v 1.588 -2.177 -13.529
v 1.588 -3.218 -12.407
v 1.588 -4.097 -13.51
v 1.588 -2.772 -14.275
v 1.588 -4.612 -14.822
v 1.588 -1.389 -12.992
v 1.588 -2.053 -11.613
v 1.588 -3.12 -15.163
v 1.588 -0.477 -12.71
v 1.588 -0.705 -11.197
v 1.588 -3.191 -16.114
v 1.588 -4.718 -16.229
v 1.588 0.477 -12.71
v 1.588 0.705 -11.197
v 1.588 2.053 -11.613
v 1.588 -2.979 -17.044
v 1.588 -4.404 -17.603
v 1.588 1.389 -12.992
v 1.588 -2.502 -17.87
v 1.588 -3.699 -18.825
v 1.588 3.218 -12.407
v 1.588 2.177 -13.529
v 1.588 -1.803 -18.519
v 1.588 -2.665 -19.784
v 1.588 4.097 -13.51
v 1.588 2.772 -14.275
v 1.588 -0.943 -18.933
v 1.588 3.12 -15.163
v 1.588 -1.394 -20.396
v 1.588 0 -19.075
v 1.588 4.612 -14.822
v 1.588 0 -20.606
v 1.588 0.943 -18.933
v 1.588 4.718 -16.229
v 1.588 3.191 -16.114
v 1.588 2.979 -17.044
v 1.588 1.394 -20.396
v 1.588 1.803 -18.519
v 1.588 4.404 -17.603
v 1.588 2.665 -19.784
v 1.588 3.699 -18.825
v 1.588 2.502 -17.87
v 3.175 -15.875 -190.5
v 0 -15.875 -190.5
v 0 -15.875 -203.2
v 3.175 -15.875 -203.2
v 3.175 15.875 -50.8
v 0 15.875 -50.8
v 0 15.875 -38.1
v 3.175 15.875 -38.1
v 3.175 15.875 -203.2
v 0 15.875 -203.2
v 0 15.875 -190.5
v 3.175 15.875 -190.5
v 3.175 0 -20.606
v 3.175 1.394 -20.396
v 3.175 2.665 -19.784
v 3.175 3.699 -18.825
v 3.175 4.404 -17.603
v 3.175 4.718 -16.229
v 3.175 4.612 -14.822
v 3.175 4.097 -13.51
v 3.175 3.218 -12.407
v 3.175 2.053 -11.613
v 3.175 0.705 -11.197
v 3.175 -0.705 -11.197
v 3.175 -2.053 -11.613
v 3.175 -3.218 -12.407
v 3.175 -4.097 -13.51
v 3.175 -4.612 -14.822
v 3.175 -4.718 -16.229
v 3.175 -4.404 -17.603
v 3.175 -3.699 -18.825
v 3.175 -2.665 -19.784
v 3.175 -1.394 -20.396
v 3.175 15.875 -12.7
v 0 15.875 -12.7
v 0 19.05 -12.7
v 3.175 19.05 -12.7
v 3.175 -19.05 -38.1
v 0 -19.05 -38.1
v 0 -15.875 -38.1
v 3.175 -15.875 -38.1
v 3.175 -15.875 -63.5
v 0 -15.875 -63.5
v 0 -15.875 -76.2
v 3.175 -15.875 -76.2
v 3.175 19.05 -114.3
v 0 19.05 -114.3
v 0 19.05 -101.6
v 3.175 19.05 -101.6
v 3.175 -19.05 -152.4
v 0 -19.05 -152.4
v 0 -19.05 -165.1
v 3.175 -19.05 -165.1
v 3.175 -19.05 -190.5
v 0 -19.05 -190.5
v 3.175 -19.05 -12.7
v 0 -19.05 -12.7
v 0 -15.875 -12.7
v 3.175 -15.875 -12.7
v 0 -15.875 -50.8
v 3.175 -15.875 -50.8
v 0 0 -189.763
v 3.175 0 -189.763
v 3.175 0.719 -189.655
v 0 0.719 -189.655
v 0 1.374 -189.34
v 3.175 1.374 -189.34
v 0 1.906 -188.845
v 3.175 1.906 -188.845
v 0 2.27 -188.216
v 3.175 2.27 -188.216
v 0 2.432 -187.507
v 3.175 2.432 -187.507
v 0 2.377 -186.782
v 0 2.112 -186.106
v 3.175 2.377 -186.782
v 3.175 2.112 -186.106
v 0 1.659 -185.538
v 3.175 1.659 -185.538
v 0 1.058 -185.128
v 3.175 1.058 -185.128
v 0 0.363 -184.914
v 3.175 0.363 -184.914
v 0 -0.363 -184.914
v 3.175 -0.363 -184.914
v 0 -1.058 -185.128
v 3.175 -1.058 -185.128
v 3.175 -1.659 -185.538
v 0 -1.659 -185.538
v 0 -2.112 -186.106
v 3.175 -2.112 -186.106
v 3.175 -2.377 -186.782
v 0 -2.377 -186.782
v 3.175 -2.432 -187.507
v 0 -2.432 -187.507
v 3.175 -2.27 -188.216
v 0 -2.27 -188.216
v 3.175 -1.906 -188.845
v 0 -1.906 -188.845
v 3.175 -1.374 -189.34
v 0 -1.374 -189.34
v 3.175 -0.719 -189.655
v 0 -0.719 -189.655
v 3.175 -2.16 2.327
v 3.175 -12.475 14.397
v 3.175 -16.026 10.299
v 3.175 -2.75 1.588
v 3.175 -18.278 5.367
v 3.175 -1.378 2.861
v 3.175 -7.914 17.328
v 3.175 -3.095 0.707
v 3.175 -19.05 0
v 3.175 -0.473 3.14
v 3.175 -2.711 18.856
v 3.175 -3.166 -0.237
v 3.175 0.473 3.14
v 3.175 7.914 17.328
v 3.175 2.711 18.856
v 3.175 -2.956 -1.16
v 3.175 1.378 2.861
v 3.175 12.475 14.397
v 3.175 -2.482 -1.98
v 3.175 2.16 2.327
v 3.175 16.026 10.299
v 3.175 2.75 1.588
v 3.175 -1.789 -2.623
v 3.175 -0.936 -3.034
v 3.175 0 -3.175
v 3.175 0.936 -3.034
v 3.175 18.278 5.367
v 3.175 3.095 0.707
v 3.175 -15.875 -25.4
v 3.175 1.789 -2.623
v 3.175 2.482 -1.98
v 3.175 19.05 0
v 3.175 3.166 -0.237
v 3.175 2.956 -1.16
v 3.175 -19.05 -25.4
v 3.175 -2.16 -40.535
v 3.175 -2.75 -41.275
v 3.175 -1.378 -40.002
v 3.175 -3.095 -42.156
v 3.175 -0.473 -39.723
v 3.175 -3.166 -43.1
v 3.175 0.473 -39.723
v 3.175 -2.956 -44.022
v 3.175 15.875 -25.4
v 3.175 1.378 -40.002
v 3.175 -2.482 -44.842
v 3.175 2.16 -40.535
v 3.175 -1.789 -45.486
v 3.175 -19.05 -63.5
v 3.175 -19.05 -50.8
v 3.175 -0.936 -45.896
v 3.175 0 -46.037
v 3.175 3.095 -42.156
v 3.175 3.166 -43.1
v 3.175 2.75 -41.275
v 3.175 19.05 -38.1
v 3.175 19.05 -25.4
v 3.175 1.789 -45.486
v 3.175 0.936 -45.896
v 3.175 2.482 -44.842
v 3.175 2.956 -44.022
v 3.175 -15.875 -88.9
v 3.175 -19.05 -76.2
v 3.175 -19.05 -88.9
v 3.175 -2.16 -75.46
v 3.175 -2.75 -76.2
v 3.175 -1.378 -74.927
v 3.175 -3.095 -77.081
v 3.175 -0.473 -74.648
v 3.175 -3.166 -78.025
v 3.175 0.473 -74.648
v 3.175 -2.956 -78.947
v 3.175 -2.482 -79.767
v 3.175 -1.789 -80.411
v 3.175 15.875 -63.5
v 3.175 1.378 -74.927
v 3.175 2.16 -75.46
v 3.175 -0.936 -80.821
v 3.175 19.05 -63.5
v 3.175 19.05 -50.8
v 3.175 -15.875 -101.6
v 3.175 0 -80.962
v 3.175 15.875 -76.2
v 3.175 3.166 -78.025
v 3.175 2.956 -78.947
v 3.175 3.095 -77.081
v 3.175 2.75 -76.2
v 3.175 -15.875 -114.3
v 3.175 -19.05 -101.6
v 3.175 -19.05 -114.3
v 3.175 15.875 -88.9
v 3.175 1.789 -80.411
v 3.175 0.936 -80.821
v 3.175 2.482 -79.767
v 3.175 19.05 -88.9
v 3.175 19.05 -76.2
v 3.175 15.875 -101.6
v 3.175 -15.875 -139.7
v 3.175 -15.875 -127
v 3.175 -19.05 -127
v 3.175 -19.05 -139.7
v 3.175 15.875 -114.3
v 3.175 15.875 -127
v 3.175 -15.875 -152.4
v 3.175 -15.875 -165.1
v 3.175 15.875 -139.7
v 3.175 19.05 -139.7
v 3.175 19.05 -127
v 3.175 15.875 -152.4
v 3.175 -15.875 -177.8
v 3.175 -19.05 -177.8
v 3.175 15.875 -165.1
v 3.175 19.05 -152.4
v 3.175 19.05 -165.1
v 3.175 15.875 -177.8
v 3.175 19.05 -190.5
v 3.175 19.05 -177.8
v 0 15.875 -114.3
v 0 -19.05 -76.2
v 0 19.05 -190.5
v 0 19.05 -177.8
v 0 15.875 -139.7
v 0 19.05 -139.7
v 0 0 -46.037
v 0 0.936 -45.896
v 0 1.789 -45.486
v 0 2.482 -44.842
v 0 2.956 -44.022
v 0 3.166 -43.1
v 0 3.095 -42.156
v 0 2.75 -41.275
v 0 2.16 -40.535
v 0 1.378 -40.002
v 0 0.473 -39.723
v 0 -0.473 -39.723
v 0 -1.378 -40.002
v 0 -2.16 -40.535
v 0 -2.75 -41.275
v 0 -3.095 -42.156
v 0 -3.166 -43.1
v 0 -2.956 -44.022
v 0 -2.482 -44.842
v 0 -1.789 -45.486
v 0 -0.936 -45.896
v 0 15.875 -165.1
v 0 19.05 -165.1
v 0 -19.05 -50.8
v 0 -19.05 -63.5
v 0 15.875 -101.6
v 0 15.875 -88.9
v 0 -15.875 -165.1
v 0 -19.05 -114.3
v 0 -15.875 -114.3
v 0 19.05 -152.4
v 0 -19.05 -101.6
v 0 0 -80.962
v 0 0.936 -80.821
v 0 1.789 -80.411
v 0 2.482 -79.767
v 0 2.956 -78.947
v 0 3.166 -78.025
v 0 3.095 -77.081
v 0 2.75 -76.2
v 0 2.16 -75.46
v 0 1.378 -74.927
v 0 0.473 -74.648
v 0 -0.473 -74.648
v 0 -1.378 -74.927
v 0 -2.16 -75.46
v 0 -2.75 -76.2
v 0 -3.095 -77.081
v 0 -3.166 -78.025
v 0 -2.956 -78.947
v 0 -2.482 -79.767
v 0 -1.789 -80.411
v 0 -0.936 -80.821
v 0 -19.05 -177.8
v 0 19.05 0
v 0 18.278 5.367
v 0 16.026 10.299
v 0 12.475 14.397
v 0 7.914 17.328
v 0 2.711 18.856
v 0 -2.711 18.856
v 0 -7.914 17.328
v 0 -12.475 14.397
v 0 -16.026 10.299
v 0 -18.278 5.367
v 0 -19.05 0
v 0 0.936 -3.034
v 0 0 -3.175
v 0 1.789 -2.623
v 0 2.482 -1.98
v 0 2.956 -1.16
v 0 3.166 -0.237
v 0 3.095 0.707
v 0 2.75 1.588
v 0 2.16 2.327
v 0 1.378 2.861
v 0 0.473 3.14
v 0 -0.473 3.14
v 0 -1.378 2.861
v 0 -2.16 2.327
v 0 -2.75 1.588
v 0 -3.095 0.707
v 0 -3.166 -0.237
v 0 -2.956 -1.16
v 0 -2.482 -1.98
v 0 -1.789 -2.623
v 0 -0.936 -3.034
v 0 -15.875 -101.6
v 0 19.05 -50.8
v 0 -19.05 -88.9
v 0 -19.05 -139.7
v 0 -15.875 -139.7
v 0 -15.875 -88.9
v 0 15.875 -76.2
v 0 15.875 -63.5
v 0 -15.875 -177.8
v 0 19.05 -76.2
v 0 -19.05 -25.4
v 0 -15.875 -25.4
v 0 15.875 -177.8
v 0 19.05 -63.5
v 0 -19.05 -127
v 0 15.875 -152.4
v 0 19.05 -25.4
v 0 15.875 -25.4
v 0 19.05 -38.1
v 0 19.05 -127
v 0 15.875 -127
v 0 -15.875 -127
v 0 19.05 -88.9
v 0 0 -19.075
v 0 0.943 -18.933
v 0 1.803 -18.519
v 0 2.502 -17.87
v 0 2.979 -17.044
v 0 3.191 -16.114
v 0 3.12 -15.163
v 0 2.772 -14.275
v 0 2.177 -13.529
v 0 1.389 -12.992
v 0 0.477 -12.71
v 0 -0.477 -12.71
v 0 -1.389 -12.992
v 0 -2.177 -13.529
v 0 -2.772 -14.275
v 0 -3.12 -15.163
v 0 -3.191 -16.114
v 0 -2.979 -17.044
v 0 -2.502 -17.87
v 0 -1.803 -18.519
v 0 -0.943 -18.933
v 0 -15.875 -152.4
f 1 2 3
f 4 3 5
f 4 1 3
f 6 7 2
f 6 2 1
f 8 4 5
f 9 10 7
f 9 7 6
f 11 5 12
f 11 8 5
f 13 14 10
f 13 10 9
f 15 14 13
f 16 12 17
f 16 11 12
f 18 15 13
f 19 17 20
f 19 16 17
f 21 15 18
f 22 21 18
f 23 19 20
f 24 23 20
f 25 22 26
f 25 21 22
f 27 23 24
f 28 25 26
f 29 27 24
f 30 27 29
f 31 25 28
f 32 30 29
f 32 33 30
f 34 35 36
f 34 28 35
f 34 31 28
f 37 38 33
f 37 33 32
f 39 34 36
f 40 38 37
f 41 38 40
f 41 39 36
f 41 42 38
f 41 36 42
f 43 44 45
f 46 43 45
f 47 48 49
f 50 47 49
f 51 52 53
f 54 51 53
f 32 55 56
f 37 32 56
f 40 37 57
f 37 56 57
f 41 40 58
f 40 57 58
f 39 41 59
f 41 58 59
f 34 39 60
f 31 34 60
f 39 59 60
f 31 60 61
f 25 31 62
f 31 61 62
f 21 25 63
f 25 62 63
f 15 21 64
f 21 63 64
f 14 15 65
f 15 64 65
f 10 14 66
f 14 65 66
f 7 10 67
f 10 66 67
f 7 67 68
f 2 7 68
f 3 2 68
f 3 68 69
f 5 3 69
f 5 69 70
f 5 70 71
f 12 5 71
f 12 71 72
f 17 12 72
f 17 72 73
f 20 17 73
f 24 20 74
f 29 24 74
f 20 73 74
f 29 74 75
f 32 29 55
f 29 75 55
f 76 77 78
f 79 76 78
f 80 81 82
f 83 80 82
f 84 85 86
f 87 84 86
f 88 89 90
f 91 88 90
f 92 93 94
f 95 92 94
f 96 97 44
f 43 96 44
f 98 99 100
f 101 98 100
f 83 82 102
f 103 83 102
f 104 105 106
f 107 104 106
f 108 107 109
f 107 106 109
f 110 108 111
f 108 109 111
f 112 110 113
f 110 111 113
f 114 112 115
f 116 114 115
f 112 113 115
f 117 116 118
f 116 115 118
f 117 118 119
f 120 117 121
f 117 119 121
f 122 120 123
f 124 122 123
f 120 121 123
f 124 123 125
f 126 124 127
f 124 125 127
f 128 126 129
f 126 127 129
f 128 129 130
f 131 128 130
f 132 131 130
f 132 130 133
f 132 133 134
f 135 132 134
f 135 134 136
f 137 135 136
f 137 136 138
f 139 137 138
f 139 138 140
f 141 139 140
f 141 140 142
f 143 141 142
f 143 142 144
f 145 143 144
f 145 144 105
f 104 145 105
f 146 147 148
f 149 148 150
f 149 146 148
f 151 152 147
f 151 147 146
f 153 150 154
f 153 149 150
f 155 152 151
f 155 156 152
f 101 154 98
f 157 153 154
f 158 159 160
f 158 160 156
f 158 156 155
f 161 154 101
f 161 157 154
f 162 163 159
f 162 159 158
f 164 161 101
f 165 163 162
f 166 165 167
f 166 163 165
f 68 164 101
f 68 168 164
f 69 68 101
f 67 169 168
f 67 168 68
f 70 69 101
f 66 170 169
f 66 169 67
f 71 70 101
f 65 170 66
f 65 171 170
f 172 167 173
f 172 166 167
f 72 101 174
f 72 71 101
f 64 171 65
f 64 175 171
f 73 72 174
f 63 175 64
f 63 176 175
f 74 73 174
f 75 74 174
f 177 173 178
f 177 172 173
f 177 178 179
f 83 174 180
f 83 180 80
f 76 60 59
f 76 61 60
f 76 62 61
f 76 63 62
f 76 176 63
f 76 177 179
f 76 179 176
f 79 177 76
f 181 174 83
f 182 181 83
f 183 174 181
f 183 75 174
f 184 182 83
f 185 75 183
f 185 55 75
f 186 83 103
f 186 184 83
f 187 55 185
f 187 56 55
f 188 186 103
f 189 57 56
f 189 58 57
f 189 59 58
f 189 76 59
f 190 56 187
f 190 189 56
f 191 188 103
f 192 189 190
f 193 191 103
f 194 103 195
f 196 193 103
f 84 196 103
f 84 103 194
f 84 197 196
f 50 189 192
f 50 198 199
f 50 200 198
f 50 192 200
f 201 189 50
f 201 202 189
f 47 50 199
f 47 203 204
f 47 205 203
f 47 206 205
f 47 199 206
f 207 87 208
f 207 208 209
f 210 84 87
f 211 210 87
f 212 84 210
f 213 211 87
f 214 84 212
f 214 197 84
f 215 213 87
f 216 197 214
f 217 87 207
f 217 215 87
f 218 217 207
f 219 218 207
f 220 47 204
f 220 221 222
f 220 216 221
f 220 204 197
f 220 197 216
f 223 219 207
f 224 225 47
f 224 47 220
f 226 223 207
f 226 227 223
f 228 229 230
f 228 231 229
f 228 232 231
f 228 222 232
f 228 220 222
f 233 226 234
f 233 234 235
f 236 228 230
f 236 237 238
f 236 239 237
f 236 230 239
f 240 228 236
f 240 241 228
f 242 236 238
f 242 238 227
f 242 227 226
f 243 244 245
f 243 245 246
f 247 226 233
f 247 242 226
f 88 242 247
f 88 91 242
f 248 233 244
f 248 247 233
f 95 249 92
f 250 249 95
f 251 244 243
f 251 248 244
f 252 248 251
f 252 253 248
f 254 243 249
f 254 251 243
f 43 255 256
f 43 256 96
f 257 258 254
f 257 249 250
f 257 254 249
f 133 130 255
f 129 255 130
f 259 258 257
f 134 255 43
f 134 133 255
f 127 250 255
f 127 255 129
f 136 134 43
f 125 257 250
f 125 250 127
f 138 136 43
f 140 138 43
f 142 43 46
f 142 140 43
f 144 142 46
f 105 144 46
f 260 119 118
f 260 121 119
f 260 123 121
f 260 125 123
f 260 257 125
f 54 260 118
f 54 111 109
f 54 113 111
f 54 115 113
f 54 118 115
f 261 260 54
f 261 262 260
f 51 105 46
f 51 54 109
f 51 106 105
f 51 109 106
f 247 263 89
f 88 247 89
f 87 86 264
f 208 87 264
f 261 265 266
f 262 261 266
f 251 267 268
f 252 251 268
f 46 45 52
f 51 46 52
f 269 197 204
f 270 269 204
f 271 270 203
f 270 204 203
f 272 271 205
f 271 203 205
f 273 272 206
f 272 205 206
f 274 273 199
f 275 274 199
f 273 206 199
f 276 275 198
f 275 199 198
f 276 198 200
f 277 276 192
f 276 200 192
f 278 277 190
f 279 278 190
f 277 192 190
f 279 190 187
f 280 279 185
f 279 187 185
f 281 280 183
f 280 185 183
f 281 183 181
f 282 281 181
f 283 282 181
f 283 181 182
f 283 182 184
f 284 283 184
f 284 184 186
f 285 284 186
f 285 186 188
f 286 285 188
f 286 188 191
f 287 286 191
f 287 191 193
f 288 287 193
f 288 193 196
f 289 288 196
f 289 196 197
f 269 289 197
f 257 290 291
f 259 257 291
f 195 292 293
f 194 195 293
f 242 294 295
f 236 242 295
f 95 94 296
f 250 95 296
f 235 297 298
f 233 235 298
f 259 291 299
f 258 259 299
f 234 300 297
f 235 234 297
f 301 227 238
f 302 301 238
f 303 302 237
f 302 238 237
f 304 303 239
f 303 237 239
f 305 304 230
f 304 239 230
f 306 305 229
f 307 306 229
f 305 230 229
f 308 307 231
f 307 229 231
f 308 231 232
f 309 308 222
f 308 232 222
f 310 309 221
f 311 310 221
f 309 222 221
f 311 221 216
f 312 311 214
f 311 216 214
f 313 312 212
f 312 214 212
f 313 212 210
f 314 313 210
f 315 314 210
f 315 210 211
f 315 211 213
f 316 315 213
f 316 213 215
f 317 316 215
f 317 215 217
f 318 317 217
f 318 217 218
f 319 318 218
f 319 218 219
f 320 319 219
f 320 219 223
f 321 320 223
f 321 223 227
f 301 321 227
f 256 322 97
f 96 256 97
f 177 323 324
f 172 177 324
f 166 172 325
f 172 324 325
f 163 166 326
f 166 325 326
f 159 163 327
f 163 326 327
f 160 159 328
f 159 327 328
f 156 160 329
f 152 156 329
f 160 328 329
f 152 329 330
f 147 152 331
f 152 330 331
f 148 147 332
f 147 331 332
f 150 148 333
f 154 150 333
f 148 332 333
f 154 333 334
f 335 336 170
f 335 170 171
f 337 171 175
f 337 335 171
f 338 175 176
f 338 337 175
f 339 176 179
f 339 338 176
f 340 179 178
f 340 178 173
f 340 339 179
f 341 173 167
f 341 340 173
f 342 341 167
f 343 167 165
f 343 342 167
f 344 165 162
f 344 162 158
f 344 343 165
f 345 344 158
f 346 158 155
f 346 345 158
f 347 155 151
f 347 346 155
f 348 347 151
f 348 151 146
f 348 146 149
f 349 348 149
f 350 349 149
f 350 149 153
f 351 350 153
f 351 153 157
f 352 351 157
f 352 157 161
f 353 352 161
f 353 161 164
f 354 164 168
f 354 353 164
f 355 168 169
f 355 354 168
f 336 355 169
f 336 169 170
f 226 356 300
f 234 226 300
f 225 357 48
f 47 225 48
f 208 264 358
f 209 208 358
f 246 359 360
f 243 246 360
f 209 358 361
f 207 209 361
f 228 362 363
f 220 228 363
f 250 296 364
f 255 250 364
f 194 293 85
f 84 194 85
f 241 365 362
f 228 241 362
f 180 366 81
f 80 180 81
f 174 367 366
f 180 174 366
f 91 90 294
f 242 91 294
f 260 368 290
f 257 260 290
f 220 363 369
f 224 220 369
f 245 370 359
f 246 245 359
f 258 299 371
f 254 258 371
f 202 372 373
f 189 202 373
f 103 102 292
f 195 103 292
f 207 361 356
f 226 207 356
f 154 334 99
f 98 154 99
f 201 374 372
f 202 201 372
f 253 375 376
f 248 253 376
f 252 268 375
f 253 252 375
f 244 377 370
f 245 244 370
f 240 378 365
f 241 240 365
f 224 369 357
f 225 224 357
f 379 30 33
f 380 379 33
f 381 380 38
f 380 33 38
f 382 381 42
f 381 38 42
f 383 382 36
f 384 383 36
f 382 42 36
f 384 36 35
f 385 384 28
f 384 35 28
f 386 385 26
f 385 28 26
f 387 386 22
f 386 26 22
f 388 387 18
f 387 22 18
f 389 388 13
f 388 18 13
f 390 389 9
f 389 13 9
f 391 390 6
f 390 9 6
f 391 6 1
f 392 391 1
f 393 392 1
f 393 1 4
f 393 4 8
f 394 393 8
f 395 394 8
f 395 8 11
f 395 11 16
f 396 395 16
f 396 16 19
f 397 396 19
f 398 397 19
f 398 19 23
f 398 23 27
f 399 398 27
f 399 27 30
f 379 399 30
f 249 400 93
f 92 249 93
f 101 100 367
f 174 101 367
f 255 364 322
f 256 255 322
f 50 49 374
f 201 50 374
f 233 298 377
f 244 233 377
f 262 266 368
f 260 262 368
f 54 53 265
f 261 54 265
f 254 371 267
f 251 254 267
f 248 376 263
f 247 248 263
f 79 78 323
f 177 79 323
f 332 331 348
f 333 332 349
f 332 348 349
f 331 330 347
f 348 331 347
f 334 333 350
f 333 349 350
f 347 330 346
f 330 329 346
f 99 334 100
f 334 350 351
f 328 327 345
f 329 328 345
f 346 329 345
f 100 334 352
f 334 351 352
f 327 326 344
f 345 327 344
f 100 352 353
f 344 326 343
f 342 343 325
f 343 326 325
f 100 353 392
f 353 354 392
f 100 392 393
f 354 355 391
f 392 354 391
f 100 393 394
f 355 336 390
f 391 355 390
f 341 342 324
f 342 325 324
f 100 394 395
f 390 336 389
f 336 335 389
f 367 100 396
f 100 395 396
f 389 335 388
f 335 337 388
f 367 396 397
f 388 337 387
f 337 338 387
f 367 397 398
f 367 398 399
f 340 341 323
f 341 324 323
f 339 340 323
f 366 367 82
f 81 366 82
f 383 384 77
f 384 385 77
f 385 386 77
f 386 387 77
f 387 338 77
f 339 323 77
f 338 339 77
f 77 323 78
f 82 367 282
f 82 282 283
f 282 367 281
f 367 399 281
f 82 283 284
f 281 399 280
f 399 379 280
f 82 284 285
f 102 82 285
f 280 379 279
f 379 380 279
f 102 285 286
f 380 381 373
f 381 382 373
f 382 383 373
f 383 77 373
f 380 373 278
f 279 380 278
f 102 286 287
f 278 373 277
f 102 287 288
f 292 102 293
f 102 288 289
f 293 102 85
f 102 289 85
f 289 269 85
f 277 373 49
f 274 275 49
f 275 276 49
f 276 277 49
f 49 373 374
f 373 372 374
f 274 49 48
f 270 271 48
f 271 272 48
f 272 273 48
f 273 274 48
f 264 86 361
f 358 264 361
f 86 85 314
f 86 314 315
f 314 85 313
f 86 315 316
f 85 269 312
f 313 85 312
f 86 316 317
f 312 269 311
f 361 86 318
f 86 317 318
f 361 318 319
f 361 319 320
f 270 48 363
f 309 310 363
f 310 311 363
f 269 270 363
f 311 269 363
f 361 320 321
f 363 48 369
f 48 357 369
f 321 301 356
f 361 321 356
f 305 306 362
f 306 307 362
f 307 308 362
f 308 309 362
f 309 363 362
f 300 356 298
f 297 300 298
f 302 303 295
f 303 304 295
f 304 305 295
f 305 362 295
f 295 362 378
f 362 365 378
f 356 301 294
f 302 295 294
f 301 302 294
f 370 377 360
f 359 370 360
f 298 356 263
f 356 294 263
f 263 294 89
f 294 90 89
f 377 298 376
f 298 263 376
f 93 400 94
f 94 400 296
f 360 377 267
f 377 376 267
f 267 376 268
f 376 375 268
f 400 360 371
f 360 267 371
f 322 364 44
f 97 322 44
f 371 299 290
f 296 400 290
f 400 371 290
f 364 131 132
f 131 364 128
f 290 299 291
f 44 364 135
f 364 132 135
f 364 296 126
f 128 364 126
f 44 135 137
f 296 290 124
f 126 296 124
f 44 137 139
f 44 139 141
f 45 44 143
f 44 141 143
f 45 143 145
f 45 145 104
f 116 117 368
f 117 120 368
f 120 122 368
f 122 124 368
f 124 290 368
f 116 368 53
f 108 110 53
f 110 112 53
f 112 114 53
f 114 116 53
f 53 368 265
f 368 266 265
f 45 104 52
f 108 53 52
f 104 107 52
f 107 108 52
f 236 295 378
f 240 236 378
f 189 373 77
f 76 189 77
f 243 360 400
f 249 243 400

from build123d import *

# Parameters (mm, degrees)
SKETCH1_R           = 3.175
BOSS_EXTRUDE1_DEPTH = 3.175
SKETCH2_R           = 3.2004
SKETCH2_R_2         = 2.4384
SKETCH2_R_3         = 3.175
CUT_EXTRUDE2_DEPTH  = 205.115710138
SKETCH3_R           = 4.73075
CUT_EXTRUDE3_DEPTH  = 1.5875


with BuildPart() as part:
    # Sketch1 → Boss-Extrude1 (new body)
    with BuildSketch(Plane(origin=(0, 0, 0), x_dir=(0, 0, -1), z_dir=(1, 0, 0))):
        with BuildLine():
            Line((12.7, 19.05), (0, 19.05))
            ThreePointArc((0, 19.05), (-19.05, 0), (0, -19.05))
            Line((0, -19.05), (12.7, -19.05))
            Line((12.7, -19.05), (12.7, -15.875))
            Line((12.7, -15.875), (25.4, -15.875))
            Line((25.4, -15.875), (25.4, -19.05))
            Line((25.4, -19.05), (38.1, -19.05))
            Line((38.1, -19.05), (38.1, -15.875))
            Line((38.1, -15.875), (50.8, -15.875))
            Line((50.8, -15.875), (50.8, -19.05))
            Line((50.8, -19.05), (63.5, -19.05))
            Line((63.5, -19.05), (63.5, -15.875))
            Line((63.5, -15.875), (76.2, -15.875))
            Line((76.2, -15.875), (76.2, -19.05))
            Line((76.2, -19.05), (88.9, -19.05))
            Line((88.9, -19.05), (88.9, -15.875))
            Line((88.9, -15.875), (101.6, -15.875))
            Line((101.6, -15.875), (101.6, -19.05))
            Line((101.6, -19.05), (114.3, -19.05))
            Line((114.3, -19.05), (114.3, -15.875))
            Line((114.3, -15.875), (127, -15.875))
            Line((127, -15.875), (127, -19.05))
            Line((127, -19.05), (139.7, -19.05))
            Line((139.7, -19.05), (139.7, -15.875))
            Line((139.7, -15.875), (152.4, -15.875))
            Line((152.4, -15.875), (152.4, -19.05))
            Line((152.4, -19.05), (165.1, -19.05))
            Line((165.1, -19.05), (165.1, -15.875))
            Line((165.1, -15.875), (177.8, -15.875))
            Line((177.8, -15.875), (177.8, -19.05))
            Line((177.8, -19.05), (190.5, -19.05))
            Line((190.5, -19.05), (190.5, -15.875))
            Line((190.5, -15.875), (203.2, -15.875))
            Line((203.2, -15.875), (203.2, 15.875))
            Line((203.2, 15.875), (190.5, 15.875))
            Line((190.5, 15.875), (190.5, 19.05))
            Line((190.5, 19.05), (177.8, 19.05))
            Line((177.8, 19.05), (177.8, 15.875))
            Line((177.8, 15.875), (165.1, 15.875))
            Line((165.1, 15.875), (165.1, 19.05))
            Line((165.1, 19.05), (152.4, 19.05))
            Line((152.4, 19.05), (152.4, 15.875))
            Line((152.4, 15.875), (139.7, 15.875))
            Line((139.7, 15.875), (139.7, 19.05))
            Line((139.7, 19.05), (127, 19.05))
            Line((127, 19.05), (127, 15.875))
            Line((127, 15.875), (114.3, 15.875))
            Line((114.3, 15.875), (114.3, 19.05))
            Line((114.3, 19.05), (101.6, 19.05))
            Line((101.6, 19.05), (101.6, 15.875))
            Line((101.6, 15.875), (88.9, 15.875))
            Line((88.9, 15.875), (88.9, 19.05))
            Line((88.9, 19.05), (76.2, 19.05))
            Line((76.2, 19.05), (76.2, 15.875))
            Line((76.2, 15.875), (63.5, 15.875))
            Line((63.5, 15.875), (63.5, 19.05))
            Line((63.5, 19.05), (50.8, 19.05))
            Line((50.8, 19.05), (50.8, 15.875))
            Line((50.8, 15.875), (38.1, 15.875))
            Line((38.1, 15.875), (38.1, 19.05))
            Line((38.1, 19.05), (25.4, 19.05))
            Line((25.4, 19.05), (25.4, 15.875))
            Line((25.4, 15.875), (12.7, 15.875))
            Line((12.7, 15.875), (12.7, 19.05))
        make_face()
        Circle(SKETCH1_R, mode=Mode.SUBTRACT)
    extrude(amount=BOSS_EXTRUDE1_DEPTH)

    # Sketch2 → Cut-Extrude2 (cut, through all)
    with BuildSketch(Plane(origin=(3.175, 0, 0), x_dir=(0, 0, -1), z_dir=(1, 0, 0))):
        with Locations((15.875, 0)):
            Circle(SKETCH2_R)
        with Locations((187.325, 0)):
            Circle(SKETCH2_R_2)
        with Locations((42.8625, -9.647e-06)):
            Circle(SKETCH2_R_3)
        with Locations((77.7875, 0)):
            Circle(SKETCH2_R_3)
    extrude(amount=-CUT_EXTRUDE2_DEPTH, mode=Mode.SUBTRACT)

    # Sketch3 → Cut-Extrude3 (cut)
    with BuildSketch(Plane(origin=(3.175, 0, 0), x_dir=(0, 0, -1), z_dir=(1, 0, 0))):
        with Locations((15.875, 0)):
            Circle(SKETCH3_R)
    extrude(amount=-CUT_EXTRUDE3_DEPTH, mode=Mode.SUBTRACT)


solid = part.part
